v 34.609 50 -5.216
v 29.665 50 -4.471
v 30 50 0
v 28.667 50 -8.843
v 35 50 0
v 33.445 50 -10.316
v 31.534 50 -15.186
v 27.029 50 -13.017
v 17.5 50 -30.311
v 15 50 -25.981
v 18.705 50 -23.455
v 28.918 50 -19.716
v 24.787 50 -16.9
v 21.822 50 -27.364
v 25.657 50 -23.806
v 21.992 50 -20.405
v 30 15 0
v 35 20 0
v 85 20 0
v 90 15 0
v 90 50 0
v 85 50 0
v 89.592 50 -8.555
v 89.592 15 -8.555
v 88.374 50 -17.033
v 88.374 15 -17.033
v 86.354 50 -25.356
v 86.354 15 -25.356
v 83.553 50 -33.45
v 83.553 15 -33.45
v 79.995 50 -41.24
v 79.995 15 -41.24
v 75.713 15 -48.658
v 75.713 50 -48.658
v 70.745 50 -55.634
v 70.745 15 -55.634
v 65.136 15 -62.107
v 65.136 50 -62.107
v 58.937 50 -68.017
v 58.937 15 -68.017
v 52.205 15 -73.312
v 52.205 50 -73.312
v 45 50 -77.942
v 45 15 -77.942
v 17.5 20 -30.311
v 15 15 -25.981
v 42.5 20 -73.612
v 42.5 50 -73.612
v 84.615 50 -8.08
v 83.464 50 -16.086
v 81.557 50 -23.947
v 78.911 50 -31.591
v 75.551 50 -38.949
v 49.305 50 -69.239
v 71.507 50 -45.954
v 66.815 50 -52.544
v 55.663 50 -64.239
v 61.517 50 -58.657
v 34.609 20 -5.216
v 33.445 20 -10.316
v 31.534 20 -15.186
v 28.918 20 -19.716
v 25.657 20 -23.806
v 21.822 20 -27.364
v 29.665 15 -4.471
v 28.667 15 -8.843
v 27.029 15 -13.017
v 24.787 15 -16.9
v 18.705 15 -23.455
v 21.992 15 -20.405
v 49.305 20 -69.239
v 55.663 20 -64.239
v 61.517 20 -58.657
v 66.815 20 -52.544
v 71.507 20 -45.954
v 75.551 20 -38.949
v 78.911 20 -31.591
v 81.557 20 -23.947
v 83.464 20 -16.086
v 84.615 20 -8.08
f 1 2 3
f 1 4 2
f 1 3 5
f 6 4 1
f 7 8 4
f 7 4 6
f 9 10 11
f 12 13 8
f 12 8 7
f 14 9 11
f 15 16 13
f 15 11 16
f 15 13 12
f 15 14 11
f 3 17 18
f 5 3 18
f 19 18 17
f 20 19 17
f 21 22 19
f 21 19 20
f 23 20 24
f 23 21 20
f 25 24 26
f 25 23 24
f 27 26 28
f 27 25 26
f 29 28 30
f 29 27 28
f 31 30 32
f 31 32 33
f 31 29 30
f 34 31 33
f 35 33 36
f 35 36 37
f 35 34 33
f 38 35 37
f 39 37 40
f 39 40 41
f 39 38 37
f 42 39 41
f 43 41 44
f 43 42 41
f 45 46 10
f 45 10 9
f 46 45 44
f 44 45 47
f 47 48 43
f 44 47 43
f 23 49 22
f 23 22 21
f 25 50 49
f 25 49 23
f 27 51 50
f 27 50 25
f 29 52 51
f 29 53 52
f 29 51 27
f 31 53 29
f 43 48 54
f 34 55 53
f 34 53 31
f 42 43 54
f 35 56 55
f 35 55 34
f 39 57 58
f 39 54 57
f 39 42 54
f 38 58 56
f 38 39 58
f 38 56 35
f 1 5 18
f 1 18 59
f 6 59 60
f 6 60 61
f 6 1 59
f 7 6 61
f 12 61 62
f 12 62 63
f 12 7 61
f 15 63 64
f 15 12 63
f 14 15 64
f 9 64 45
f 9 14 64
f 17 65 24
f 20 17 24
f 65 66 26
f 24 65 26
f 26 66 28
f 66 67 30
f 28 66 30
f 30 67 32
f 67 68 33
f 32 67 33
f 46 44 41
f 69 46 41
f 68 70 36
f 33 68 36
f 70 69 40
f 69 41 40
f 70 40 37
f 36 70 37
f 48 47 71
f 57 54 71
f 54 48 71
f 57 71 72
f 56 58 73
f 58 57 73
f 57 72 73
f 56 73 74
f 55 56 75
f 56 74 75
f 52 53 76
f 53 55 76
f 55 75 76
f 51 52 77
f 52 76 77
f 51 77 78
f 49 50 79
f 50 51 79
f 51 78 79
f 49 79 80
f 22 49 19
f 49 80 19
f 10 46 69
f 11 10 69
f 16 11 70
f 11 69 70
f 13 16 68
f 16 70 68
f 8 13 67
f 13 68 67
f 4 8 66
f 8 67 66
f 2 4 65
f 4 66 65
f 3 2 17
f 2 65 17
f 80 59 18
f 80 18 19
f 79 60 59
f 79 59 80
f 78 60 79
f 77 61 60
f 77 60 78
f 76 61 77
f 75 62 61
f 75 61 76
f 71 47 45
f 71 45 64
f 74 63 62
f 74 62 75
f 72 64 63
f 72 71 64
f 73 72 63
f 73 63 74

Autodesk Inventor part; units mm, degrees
ref_plane "YZ Plane" through (0, 0, 0) normal (1, 0, 0) x (0, 1, 0)
ref_plane "XZ Plane" through (0, 0, 0) normal (0, 1, 0) x (-1, 0, 0)
ref_plane "XY Plane" through (0, 0, 0) normal (0, 0, 1) x (1, 0, 0)
sketch "Sketch1" plane through (0, 0, 0) normal (0, 0, 1) x (1, 0, 0)
  line L0 (0, 0) -> (0, 50) construction
  line L1 (0, 50) -> (30, 50) construction
  line L2 (30, 50) -> (30, 15)
  line L3 (30, 15) -> (90, 15)
  line L4 (90, 15) -> (90, 50)
  line L5 (90, 50) -> (85, 50)
  line L6 (85, 50) -> (85, 20)
  line L7 (85, 20) -> (35, 20)
  line L8 (35, 20) -> (35, 50)
  line L9 (35, 50) -> (30, 50)
  dimension "d0" = 50
  dimension "d1" = 30
  dimension "d2" = 35
  dimension "d3" = 60
  dimension "d4" = 35
  dimension "d5" = 5
  dimension "d6" = 30
  dimension "d7" = 50
revolve "Revolution1" add sketch "Sketch1" angle 60 about axis through (0, 0, 0) along (0, 1, 0)
properties part number "track z2201"
